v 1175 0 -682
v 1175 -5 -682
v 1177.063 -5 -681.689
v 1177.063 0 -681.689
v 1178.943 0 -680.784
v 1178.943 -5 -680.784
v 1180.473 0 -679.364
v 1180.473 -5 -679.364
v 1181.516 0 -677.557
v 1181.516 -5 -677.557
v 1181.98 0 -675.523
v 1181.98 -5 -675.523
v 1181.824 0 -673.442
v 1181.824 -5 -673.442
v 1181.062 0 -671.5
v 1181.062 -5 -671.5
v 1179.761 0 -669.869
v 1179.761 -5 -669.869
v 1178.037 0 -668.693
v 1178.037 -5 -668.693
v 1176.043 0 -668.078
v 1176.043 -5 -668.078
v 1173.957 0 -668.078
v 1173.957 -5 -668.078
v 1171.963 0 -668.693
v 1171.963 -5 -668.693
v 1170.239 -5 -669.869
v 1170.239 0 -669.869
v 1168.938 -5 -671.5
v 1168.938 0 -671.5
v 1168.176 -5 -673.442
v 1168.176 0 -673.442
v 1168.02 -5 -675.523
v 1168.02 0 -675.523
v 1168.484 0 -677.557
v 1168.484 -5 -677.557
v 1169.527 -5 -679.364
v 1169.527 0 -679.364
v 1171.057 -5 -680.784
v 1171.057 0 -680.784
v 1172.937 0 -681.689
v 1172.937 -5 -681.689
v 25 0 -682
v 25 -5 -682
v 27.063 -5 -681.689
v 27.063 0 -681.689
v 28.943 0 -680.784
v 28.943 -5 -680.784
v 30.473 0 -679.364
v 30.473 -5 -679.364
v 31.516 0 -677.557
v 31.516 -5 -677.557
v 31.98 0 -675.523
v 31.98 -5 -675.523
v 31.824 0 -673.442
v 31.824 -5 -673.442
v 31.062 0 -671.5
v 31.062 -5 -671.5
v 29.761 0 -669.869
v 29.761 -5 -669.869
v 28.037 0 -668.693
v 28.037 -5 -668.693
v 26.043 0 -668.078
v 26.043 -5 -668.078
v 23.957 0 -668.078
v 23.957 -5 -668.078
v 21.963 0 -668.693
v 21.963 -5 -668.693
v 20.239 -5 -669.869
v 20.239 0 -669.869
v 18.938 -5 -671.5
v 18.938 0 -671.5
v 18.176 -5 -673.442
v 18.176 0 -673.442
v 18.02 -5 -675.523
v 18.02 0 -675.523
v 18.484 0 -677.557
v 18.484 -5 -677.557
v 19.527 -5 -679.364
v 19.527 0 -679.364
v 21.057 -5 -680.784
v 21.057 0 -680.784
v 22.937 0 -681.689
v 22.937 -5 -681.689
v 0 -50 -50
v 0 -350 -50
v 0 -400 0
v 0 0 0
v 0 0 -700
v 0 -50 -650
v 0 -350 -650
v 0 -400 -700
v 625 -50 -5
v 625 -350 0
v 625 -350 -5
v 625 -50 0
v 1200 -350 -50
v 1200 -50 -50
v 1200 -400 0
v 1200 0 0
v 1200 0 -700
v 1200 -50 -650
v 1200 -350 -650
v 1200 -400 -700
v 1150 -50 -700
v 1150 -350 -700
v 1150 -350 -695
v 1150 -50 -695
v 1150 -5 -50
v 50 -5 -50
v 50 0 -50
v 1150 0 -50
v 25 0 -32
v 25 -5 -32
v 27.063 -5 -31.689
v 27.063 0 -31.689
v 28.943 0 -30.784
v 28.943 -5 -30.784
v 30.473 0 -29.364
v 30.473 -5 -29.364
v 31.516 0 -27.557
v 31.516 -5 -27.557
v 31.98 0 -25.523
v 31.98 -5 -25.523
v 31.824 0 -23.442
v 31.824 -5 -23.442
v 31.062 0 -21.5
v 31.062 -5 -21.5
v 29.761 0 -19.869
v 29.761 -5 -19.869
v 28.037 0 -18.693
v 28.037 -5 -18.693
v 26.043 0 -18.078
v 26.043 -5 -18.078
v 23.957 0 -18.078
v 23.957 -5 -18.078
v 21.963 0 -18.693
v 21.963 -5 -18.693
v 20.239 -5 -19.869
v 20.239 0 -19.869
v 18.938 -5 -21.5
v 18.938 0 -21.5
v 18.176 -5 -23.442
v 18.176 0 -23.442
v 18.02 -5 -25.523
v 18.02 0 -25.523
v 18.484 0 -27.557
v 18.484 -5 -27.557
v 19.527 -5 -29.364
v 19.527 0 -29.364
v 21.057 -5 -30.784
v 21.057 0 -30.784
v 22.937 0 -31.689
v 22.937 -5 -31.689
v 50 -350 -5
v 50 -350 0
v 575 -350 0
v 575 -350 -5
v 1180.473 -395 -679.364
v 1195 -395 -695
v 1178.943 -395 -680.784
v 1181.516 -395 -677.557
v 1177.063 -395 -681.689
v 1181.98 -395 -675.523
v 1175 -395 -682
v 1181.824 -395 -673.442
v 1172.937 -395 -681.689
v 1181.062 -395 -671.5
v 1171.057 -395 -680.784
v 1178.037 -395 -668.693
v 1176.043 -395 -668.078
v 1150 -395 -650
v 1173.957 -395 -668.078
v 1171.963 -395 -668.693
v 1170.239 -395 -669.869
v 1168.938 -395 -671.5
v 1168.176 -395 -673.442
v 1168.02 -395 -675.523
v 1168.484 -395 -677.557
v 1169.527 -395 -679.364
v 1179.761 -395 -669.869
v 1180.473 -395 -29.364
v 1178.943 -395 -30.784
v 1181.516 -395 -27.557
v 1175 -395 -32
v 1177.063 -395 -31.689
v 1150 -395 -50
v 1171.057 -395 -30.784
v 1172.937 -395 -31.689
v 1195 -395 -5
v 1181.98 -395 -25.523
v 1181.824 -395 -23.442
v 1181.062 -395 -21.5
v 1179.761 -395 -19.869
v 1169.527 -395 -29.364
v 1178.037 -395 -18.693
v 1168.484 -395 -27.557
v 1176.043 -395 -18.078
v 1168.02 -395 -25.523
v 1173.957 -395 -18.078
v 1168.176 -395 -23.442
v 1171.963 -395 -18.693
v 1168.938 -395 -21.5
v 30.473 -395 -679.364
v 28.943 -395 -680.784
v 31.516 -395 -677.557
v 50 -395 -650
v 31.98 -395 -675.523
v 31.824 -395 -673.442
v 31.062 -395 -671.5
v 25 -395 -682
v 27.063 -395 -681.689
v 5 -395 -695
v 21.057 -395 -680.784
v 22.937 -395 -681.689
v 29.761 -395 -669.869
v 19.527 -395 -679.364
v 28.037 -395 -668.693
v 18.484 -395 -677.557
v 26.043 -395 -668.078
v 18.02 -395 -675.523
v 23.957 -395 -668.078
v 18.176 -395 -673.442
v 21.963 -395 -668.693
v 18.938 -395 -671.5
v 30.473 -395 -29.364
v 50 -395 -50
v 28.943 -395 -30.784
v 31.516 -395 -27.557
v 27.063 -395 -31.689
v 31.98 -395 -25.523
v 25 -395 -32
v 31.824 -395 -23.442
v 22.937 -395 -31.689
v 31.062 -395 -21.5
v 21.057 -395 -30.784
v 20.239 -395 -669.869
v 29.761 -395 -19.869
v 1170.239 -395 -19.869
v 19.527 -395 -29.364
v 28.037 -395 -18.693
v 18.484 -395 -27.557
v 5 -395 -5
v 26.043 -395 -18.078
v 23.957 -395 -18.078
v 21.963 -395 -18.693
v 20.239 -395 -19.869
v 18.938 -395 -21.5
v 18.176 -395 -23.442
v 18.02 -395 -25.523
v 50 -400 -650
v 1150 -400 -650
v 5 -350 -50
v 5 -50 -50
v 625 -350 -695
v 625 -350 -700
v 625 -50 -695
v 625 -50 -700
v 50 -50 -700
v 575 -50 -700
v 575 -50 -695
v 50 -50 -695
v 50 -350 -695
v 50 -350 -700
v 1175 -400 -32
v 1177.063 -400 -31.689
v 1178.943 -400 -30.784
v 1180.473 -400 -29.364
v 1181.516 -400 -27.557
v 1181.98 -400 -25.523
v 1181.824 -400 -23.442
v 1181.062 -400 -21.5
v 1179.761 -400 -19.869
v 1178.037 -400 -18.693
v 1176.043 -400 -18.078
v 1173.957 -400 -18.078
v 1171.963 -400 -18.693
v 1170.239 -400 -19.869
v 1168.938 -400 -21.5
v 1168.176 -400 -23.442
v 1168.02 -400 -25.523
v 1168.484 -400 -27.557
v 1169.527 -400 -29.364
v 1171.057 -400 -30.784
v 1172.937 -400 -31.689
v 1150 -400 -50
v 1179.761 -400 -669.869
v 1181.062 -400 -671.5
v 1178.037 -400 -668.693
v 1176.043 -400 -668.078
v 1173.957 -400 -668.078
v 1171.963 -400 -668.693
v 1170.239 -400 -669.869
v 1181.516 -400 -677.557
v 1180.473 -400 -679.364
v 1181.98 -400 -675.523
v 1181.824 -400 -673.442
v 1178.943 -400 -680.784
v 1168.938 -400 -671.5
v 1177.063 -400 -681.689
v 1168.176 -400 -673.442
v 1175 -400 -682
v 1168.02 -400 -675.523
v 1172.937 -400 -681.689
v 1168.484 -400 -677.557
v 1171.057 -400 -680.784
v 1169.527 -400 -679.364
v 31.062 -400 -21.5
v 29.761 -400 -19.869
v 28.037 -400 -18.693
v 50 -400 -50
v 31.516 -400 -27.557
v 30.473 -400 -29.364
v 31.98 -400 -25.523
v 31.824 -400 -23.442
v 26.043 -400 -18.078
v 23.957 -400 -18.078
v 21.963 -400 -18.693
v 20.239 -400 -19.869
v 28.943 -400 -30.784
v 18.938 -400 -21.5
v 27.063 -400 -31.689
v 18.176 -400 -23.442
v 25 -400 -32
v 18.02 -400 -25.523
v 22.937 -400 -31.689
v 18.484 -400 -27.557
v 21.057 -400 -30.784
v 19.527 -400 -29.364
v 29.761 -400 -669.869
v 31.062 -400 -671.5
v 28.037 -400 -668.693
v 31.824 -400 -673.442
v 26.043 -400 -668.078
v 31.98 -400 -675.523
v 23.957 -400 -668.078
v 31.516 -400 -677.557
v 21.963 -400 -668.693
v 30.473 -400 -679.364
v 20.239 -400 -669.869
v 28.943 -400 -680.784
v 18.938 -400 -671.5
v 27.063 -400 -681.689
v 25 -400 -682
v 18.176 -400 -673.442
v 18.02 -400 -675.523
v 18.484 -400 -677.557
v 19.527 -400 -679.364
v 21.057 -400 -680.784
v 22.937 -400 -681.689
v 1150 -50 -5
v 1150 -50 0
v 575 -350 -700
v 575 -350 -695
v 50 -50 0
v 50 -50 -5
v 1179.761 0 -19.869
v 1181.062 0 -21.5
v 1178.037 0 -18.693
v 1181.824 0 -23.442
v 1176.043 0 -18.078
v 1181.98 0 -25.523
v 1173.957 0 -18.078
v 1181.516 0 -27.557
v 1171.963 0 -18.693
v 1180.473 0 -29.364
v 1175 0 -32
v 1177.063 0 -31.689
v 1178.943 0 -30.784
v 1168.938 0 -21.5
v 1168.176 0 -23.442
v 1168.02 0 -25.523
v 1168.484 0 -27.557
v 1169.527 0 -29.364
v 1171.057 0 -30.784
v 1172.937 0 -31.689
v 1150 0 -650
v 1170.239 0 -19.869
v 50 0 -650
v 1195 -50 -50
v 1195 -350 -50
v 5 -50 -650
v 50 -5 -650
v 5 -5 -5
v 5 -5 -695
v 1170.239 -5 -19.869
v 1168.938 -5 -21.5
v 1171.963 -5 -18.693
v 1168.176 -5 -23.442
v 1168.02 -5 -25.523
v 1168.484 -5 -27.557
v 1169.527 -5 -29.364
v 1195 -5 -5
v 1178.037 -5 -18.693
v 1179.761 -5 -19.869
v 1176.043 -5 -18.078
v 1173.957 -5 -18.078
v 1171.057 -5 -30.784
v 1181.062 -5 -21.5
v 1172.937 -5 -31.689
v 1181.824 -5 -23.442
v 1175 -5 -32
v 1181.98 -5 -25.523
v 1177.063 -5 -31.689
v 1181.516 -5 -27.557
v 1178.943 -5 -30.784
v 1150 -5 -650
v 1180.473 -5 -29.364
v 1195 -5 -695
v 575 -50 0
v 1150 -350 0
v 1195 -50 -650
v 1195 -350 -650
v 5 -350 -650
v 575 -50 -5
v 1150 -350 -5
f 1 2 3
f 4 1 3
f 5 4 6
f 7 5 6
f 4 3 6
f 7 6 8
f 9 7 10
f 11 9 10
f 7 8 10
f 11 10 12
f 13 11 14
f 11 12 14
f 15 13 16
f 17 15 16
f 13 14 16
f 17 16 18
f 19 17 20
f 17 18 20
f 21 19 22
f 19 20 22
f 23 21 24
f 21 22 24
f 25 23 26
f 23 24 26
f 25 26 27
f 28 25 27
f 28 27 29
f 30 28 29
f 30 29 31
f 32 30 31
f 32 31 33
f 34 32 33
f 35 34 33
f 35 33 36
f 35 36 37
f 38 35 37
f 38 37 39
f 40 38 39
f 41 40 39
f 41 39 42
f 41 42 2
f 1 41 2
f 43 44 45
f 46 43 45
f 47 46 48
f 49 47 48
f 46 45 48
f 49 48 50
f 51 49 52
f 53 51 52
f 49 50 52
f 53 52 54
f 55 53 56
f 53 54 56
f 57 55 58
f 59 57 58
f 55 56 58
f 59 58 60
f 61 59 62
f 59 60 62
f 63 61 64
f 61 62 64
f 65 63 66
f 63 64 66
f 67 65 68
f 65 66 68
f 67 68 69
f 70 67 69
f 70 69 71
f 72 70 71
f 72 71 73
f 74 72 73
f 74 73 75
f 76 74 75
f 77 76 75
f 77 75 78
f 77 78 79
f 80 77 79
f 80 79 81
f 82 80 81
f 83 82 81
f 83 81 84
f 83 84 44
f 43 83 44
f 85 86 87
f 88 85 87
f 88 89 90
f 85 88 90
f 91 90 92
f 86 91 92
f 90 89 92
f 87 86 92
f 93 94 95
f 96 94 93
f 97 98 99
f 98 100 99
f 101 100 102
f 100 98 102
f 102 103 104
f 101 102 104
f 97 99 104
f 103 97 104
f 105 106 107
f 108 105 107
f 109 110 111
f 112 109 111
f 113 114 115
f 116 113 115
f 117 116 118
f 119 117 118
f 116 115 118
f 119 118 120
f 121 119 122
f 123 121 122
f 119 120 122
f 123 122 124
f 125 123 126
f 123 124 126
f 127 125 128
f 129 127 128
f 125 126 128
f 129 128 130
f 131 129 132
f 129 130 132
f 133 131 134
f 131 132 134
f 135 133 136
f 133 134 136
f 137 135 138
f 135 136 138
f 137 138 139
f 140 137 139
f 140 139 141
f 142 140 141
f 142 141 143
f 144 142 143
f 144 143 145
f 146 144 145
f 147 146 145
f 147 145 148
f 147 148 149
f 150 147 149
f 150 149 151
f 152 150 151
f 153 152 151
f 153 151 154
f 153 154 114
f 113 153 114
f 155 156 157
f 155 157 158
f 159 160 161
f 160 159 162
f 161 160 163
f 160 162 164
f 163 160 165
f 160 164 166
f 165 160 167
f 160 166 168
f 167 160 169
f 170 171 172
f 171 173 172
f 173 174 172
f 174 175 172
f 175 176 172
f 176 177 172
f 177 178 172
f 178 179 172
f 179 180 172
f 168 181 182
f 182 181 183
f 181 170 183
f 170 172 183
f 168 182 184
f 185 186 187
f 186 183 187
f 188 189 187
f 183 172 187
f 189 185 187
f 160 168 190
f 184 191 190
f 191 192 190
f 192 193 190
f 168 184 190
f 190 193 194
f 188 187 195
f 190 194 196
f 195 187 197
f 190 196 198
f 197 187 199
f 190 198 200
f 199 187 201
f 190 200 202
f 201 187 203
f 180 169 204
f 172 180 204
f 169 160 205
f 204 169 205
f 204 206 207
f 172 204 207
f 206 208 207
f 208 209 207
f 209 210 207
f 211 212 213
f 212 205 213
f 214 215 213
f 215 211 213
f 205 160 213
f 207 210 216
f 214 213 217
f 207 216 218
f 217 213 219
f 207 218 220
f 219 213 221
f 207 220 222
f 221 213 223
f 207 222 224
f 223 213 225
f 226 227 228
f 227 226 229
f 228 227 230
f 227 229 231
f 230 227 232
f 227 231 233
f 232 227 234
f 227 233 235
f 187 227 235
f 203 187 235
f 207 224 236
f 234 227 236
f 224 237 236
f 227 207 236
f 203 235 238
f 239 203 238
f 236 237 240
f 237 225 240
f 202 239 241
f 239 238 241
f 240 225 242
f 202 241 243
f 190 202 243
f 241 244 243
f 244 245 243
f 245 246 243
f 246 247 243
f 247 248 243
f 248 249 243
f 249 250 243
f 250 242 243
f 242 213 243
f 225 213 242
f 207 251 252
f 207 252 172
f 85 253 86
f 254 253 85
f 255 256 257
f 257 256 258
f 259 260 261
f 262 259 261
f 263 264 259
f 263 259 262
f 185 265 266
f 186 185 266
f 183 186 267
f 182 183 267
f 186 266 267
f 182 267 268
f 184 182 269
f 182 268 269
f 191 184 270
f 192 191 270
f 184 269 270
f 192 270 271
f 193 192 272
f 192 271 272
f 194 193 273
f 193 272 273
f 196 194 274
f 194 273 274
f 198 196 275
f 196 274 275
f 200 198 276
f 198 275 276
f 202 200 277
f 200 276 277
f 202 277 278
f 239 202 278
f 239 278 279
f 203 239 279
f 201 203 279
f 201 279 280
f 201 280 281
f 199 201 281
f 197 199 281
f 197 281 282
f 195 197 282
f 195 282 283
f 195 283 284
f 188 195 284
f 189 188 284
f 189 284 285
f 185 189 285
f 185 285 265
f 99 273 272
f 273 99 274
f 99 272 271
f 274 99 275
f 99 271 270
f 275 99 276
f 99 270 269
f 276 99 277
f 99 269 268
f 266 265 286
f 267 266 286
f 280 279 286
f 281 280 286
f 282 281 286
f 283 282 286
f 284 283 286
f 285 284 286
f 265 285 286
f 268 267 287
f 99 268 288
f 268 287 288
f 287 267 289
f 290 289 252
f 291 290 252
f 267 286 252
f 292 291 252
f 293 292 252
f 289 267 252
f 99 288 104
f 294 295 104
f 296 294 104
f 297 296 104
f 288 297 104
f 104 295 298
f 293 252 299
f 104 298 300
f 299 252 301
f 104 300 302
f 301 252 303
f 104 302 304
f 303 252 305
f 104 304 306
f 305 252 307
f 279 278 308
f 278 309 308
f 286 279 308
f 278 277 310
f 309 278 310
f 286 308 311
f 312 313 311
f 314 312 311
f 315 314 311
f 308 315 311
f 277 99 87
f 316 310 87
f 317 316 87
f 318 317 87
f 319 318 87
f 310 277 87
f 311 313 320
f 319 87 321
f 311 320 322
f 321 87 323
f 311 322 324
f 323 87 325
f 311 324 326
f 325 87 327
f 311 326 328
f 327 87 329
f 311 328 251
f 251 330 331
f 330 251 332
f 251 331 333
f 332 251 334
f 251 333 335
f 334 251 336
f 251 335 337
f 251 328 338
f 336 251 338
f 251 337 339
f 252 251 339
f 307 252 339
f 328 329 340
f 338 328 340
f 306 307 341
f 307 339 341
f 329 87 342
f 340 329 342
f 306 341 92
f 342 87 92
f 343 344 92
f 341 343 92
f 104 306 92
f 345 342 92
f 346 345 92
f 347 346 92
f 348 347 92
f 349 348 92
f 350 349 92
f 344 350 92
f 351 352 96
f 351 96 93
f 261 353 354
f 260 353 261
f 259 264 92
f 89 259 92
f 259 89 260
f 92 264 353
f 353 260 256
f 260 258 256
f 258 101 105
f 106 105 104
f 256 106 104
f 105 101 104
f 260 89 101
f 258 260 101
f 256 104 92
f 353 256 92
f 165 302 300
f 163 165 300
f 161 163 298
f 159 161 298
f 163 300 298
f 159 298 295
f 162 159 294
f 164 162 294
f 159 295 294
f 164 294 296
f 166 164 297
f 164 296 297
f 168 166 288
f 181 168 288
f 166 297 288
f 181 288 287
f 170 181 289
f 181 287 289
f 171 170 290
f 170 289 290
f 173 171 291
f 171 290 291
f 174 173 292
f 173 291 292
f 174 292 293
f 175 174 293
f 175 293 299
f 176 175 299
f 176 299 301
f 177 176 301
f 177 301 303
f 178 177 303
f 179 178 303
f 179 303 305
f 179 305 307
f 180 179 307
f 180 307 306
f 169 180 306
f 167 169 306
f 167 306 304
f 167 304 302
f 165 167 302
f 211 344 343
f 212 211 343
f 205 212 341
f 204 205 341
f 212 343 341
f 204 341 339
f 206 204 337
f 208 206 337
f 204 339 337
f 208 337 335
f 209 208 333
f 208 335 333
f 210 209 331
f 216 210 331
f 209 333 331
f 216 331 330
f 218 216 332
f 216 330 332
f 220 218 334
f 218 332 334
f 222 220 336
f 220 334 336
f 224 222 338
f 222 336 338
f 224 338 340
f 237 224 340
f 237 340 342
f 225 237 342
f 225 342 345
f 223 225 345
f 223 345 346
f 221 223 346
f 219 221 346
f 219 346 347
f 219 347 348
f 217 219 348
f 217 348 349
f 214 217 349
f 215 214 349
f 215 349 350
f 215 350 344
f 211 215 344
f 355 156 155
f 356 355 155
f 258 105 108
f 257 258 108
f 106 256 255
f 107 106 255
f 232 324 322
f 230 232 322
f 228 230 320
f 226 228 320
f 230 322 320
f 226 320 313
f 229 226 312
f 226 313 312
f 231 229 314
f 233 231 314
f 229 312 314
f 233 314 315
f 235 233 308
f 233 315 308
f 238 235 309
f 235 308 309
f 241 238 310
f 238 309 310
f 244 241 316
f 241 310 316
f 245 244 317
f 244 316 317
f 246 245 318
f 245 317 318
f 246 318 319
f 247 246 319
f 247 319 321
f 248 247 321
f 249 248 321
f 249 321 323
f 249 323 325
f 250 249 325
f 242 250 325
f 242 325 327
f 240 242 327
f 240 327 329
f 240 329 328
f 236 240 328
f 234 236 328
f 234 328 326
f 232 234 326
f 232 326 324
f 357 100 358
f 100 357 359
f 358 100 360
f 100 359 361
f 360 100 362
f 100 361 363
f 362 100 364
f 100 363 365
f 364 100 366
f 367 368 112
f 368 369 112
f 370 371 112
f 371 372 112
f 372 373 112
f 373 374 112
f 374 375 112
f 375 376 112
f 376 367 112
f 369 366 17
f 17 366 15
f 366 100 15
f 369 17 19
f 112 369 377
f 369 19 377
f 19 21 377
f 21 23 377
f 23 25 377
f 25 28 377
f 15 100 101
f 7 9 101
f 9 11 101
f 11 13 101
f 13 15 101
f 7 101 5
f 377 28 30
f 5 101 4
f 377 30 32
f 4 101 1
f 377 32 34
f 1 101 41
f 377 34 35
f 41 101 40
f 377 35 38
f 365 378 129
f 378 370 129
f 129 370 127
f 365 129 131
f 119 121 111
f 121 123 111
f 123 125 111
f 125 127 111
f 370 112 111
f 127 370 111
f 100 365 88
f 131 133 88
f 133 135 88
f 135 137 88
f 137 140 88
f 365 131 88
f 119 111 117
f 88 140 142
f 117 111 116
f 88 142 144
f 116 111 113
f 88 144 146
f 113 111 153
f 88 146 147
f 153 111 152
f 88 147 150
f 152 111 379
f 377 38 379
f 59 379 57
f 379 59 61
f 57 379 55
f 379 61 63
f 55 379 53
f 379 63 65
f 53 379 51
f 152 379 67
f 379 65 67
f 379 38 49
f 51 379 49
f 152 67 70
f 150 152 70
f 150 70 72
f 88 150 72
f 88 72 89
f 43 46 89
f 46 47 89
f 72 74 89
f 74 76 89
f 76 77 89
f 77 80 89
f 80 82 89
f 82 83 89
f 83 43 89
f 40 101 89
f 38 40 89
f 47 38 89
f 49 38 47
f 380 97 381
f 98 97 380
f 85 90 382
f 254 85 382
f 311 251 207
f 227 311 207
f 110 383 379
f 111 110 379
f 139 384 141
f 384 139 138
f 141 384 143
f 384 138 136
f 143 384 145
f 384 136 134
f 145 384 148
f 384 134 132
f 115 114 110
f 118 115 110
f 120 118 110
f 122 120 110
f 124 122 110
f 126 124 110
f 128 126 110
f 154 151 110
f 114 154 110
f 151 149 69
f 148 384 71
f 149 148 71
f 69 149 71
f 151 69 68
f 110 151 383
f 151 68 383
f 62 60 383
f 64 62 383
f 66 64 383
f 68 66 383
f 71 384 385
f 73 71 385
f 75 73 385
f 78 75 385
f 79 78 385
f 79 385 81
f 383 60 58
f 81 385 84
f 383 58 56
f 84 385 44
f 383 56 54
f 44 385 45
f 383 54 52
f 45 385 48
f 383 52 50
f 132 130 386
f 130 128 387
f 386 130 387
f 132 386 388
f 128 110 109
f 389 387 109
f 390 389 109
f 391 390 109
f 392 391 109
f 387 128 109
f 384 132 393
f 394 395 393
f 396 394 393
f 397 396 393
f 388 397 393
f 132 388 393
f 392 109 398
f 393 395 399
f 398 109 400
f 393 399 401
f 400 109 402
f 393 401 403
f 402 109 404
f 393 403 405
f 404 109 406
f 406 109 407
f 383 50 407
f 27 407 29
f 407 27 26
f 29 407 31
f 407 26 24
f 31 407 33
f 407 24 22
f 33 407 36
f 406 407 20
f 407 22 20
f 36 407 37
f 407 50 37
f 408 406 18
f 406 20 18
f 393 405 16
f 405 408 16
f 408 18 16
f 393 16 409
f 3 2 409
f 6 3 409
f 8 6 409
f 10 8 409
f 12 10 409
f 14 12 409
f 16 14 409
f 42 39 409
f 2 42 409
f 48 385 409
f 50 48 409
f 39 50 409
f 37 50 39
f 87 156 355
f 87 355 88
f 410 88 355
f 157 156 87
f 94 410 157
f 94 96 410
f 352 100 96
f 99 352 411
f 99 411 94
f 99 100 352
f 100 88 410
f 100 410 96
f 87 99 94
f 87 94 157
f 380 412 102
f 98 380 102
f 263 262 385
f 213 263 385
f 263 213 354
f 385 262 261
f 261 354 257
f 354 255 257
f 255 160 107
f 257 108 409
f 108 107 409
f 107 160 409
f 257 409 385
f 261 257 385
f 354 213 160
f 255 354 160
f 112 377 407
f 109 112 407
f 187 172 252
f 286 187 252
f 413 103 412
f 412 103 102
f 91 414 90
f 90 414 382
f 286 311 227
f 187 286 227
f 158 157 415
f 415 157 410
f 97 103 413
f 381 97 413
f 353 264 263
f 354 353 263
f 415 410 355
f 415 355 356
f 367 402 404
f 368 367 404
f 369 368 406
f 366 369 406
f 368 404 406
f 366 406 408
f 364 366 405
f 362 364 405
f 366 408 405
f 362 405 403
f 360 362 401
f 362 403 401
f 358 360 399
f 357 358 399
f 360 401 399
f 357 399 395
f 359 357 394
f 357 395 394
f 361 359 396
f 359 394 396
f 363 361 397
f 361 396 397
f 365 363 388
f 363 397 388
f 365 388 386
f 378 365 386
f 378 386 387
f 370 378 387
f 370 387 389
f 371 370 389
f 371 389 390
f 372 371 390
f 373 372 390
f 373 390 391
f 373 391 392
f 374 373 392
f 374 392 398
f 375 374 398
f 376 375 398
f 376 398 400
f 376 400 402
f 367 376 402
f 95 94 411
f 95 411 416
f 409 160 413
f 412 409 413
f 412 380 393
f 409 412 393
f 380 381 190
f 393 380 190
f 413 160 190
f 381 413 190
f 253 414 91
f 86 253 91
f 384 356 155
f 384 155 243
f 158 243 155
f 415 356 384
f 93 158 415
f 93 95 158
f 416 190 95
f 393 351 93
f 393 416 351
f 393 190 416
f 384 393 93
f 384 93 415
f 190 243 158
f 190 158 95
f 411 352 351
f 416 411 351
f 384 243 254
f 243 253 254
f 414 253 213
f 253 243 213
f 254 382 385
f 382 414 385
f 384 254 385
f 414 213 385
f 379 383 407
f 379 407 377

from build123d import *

# Parameters (mm, degrees)
SKETCH8_W           = 50
SKETCH8_H           = 300
BOSS_EXTRUDE2_DEPTH = 5
BOSS_EXTRUDE3_DEPTH = 600
SKETCH11_R          = 7
CUT_EXTRUDE1_DEPTH  = 405


with BuildPart() as part:
    # Sweep1: sweep along a path in Sketch3
    with BuildLine(Plane.XY) as sweep1_path:
        Line((0, 0), (1200, 0))
        Line((1200, 0), (1200, -400))
        Line((1200, -400), (0, -400))
        Line((0, -400), (0, 0))
    # Sketch1 → Sweep1 (sweep)
    with BuildSketch(Plane(origin=(0, 0, 0), x_dir=(0, 0, -1), z_dir=(1, 0, 0))):
        Polygon((0, 0), (0, -50), (5, -50), (5, -5), (50, -5), (50, 0), align=None)
    sweep(path=sweep1_path.line, transition=Transition.RIGHT)

    # Sketch8 → Boss-Extrude2 (add)
    with BuildSketch(Plane.XY):
        with Locations((600, -200)):
            Rectangle(SKETCH8_W, SKETCH8_H)
    extrude(amount=-BOSS_EXTRUDE2_DEPTH)


with BuildPart() as body_2:
    # Mirror8: mirrored copy
    add(part.part.mirror(Plane.XY.offset(-350)))


with BuildPart() as part_1:
    add(part.part)

    add(body_2.part)  # Boss-Extrude3 merges body 2
    # Sketch10 → Boss-Extrude3 (add)
    with BuildSketch(Plane.XY.offset(-650)):
        Polygon((50, 0), (0, 0), (0, -50), (5, -50), (5, -5), (50, -5), align=None)
        Polygon((1195, -50), (1200, -50), (1200, 0), (1150, 0), (1150, -5), (1195, -5), align=None)
        Polygon((1150, -400), (1200, -400), (1200, -350), (1195, -350), (1195, -395), (1150, -395), align=None)
        Polygon((5, -350), (0, -350), (0, -400), (50, -400), (50, -395), (5, -395), align=None)
    extrude(amount=BOSS_EXTRUDE3_DEPTH)

    # Sketch11 → Cut-Extrude1 (cut)
    with BuildSketch(Plane.XZ.offset(400)):
        with Locations(Location((25, -25, 0), (0, 0, 270))):
            Circle(SKETCH11_R)
        with Locations(Location((1175, -25, 0), (0, 0, 270))):
            Circle(SKETCH11_R)
        with Locations(Location((1175, -675, 0), (0, 0, 270))):
            Circle(SKETCH11_R)
        with Locations(Location((25, -675, 0), (0, 0, 270))):
            Circle(SKETCH11_R)
    extrude(amount=-CUT_EXTRUDE1_DEPTH, mode=Mode.SUBTRACT)


solid = part_1.part
